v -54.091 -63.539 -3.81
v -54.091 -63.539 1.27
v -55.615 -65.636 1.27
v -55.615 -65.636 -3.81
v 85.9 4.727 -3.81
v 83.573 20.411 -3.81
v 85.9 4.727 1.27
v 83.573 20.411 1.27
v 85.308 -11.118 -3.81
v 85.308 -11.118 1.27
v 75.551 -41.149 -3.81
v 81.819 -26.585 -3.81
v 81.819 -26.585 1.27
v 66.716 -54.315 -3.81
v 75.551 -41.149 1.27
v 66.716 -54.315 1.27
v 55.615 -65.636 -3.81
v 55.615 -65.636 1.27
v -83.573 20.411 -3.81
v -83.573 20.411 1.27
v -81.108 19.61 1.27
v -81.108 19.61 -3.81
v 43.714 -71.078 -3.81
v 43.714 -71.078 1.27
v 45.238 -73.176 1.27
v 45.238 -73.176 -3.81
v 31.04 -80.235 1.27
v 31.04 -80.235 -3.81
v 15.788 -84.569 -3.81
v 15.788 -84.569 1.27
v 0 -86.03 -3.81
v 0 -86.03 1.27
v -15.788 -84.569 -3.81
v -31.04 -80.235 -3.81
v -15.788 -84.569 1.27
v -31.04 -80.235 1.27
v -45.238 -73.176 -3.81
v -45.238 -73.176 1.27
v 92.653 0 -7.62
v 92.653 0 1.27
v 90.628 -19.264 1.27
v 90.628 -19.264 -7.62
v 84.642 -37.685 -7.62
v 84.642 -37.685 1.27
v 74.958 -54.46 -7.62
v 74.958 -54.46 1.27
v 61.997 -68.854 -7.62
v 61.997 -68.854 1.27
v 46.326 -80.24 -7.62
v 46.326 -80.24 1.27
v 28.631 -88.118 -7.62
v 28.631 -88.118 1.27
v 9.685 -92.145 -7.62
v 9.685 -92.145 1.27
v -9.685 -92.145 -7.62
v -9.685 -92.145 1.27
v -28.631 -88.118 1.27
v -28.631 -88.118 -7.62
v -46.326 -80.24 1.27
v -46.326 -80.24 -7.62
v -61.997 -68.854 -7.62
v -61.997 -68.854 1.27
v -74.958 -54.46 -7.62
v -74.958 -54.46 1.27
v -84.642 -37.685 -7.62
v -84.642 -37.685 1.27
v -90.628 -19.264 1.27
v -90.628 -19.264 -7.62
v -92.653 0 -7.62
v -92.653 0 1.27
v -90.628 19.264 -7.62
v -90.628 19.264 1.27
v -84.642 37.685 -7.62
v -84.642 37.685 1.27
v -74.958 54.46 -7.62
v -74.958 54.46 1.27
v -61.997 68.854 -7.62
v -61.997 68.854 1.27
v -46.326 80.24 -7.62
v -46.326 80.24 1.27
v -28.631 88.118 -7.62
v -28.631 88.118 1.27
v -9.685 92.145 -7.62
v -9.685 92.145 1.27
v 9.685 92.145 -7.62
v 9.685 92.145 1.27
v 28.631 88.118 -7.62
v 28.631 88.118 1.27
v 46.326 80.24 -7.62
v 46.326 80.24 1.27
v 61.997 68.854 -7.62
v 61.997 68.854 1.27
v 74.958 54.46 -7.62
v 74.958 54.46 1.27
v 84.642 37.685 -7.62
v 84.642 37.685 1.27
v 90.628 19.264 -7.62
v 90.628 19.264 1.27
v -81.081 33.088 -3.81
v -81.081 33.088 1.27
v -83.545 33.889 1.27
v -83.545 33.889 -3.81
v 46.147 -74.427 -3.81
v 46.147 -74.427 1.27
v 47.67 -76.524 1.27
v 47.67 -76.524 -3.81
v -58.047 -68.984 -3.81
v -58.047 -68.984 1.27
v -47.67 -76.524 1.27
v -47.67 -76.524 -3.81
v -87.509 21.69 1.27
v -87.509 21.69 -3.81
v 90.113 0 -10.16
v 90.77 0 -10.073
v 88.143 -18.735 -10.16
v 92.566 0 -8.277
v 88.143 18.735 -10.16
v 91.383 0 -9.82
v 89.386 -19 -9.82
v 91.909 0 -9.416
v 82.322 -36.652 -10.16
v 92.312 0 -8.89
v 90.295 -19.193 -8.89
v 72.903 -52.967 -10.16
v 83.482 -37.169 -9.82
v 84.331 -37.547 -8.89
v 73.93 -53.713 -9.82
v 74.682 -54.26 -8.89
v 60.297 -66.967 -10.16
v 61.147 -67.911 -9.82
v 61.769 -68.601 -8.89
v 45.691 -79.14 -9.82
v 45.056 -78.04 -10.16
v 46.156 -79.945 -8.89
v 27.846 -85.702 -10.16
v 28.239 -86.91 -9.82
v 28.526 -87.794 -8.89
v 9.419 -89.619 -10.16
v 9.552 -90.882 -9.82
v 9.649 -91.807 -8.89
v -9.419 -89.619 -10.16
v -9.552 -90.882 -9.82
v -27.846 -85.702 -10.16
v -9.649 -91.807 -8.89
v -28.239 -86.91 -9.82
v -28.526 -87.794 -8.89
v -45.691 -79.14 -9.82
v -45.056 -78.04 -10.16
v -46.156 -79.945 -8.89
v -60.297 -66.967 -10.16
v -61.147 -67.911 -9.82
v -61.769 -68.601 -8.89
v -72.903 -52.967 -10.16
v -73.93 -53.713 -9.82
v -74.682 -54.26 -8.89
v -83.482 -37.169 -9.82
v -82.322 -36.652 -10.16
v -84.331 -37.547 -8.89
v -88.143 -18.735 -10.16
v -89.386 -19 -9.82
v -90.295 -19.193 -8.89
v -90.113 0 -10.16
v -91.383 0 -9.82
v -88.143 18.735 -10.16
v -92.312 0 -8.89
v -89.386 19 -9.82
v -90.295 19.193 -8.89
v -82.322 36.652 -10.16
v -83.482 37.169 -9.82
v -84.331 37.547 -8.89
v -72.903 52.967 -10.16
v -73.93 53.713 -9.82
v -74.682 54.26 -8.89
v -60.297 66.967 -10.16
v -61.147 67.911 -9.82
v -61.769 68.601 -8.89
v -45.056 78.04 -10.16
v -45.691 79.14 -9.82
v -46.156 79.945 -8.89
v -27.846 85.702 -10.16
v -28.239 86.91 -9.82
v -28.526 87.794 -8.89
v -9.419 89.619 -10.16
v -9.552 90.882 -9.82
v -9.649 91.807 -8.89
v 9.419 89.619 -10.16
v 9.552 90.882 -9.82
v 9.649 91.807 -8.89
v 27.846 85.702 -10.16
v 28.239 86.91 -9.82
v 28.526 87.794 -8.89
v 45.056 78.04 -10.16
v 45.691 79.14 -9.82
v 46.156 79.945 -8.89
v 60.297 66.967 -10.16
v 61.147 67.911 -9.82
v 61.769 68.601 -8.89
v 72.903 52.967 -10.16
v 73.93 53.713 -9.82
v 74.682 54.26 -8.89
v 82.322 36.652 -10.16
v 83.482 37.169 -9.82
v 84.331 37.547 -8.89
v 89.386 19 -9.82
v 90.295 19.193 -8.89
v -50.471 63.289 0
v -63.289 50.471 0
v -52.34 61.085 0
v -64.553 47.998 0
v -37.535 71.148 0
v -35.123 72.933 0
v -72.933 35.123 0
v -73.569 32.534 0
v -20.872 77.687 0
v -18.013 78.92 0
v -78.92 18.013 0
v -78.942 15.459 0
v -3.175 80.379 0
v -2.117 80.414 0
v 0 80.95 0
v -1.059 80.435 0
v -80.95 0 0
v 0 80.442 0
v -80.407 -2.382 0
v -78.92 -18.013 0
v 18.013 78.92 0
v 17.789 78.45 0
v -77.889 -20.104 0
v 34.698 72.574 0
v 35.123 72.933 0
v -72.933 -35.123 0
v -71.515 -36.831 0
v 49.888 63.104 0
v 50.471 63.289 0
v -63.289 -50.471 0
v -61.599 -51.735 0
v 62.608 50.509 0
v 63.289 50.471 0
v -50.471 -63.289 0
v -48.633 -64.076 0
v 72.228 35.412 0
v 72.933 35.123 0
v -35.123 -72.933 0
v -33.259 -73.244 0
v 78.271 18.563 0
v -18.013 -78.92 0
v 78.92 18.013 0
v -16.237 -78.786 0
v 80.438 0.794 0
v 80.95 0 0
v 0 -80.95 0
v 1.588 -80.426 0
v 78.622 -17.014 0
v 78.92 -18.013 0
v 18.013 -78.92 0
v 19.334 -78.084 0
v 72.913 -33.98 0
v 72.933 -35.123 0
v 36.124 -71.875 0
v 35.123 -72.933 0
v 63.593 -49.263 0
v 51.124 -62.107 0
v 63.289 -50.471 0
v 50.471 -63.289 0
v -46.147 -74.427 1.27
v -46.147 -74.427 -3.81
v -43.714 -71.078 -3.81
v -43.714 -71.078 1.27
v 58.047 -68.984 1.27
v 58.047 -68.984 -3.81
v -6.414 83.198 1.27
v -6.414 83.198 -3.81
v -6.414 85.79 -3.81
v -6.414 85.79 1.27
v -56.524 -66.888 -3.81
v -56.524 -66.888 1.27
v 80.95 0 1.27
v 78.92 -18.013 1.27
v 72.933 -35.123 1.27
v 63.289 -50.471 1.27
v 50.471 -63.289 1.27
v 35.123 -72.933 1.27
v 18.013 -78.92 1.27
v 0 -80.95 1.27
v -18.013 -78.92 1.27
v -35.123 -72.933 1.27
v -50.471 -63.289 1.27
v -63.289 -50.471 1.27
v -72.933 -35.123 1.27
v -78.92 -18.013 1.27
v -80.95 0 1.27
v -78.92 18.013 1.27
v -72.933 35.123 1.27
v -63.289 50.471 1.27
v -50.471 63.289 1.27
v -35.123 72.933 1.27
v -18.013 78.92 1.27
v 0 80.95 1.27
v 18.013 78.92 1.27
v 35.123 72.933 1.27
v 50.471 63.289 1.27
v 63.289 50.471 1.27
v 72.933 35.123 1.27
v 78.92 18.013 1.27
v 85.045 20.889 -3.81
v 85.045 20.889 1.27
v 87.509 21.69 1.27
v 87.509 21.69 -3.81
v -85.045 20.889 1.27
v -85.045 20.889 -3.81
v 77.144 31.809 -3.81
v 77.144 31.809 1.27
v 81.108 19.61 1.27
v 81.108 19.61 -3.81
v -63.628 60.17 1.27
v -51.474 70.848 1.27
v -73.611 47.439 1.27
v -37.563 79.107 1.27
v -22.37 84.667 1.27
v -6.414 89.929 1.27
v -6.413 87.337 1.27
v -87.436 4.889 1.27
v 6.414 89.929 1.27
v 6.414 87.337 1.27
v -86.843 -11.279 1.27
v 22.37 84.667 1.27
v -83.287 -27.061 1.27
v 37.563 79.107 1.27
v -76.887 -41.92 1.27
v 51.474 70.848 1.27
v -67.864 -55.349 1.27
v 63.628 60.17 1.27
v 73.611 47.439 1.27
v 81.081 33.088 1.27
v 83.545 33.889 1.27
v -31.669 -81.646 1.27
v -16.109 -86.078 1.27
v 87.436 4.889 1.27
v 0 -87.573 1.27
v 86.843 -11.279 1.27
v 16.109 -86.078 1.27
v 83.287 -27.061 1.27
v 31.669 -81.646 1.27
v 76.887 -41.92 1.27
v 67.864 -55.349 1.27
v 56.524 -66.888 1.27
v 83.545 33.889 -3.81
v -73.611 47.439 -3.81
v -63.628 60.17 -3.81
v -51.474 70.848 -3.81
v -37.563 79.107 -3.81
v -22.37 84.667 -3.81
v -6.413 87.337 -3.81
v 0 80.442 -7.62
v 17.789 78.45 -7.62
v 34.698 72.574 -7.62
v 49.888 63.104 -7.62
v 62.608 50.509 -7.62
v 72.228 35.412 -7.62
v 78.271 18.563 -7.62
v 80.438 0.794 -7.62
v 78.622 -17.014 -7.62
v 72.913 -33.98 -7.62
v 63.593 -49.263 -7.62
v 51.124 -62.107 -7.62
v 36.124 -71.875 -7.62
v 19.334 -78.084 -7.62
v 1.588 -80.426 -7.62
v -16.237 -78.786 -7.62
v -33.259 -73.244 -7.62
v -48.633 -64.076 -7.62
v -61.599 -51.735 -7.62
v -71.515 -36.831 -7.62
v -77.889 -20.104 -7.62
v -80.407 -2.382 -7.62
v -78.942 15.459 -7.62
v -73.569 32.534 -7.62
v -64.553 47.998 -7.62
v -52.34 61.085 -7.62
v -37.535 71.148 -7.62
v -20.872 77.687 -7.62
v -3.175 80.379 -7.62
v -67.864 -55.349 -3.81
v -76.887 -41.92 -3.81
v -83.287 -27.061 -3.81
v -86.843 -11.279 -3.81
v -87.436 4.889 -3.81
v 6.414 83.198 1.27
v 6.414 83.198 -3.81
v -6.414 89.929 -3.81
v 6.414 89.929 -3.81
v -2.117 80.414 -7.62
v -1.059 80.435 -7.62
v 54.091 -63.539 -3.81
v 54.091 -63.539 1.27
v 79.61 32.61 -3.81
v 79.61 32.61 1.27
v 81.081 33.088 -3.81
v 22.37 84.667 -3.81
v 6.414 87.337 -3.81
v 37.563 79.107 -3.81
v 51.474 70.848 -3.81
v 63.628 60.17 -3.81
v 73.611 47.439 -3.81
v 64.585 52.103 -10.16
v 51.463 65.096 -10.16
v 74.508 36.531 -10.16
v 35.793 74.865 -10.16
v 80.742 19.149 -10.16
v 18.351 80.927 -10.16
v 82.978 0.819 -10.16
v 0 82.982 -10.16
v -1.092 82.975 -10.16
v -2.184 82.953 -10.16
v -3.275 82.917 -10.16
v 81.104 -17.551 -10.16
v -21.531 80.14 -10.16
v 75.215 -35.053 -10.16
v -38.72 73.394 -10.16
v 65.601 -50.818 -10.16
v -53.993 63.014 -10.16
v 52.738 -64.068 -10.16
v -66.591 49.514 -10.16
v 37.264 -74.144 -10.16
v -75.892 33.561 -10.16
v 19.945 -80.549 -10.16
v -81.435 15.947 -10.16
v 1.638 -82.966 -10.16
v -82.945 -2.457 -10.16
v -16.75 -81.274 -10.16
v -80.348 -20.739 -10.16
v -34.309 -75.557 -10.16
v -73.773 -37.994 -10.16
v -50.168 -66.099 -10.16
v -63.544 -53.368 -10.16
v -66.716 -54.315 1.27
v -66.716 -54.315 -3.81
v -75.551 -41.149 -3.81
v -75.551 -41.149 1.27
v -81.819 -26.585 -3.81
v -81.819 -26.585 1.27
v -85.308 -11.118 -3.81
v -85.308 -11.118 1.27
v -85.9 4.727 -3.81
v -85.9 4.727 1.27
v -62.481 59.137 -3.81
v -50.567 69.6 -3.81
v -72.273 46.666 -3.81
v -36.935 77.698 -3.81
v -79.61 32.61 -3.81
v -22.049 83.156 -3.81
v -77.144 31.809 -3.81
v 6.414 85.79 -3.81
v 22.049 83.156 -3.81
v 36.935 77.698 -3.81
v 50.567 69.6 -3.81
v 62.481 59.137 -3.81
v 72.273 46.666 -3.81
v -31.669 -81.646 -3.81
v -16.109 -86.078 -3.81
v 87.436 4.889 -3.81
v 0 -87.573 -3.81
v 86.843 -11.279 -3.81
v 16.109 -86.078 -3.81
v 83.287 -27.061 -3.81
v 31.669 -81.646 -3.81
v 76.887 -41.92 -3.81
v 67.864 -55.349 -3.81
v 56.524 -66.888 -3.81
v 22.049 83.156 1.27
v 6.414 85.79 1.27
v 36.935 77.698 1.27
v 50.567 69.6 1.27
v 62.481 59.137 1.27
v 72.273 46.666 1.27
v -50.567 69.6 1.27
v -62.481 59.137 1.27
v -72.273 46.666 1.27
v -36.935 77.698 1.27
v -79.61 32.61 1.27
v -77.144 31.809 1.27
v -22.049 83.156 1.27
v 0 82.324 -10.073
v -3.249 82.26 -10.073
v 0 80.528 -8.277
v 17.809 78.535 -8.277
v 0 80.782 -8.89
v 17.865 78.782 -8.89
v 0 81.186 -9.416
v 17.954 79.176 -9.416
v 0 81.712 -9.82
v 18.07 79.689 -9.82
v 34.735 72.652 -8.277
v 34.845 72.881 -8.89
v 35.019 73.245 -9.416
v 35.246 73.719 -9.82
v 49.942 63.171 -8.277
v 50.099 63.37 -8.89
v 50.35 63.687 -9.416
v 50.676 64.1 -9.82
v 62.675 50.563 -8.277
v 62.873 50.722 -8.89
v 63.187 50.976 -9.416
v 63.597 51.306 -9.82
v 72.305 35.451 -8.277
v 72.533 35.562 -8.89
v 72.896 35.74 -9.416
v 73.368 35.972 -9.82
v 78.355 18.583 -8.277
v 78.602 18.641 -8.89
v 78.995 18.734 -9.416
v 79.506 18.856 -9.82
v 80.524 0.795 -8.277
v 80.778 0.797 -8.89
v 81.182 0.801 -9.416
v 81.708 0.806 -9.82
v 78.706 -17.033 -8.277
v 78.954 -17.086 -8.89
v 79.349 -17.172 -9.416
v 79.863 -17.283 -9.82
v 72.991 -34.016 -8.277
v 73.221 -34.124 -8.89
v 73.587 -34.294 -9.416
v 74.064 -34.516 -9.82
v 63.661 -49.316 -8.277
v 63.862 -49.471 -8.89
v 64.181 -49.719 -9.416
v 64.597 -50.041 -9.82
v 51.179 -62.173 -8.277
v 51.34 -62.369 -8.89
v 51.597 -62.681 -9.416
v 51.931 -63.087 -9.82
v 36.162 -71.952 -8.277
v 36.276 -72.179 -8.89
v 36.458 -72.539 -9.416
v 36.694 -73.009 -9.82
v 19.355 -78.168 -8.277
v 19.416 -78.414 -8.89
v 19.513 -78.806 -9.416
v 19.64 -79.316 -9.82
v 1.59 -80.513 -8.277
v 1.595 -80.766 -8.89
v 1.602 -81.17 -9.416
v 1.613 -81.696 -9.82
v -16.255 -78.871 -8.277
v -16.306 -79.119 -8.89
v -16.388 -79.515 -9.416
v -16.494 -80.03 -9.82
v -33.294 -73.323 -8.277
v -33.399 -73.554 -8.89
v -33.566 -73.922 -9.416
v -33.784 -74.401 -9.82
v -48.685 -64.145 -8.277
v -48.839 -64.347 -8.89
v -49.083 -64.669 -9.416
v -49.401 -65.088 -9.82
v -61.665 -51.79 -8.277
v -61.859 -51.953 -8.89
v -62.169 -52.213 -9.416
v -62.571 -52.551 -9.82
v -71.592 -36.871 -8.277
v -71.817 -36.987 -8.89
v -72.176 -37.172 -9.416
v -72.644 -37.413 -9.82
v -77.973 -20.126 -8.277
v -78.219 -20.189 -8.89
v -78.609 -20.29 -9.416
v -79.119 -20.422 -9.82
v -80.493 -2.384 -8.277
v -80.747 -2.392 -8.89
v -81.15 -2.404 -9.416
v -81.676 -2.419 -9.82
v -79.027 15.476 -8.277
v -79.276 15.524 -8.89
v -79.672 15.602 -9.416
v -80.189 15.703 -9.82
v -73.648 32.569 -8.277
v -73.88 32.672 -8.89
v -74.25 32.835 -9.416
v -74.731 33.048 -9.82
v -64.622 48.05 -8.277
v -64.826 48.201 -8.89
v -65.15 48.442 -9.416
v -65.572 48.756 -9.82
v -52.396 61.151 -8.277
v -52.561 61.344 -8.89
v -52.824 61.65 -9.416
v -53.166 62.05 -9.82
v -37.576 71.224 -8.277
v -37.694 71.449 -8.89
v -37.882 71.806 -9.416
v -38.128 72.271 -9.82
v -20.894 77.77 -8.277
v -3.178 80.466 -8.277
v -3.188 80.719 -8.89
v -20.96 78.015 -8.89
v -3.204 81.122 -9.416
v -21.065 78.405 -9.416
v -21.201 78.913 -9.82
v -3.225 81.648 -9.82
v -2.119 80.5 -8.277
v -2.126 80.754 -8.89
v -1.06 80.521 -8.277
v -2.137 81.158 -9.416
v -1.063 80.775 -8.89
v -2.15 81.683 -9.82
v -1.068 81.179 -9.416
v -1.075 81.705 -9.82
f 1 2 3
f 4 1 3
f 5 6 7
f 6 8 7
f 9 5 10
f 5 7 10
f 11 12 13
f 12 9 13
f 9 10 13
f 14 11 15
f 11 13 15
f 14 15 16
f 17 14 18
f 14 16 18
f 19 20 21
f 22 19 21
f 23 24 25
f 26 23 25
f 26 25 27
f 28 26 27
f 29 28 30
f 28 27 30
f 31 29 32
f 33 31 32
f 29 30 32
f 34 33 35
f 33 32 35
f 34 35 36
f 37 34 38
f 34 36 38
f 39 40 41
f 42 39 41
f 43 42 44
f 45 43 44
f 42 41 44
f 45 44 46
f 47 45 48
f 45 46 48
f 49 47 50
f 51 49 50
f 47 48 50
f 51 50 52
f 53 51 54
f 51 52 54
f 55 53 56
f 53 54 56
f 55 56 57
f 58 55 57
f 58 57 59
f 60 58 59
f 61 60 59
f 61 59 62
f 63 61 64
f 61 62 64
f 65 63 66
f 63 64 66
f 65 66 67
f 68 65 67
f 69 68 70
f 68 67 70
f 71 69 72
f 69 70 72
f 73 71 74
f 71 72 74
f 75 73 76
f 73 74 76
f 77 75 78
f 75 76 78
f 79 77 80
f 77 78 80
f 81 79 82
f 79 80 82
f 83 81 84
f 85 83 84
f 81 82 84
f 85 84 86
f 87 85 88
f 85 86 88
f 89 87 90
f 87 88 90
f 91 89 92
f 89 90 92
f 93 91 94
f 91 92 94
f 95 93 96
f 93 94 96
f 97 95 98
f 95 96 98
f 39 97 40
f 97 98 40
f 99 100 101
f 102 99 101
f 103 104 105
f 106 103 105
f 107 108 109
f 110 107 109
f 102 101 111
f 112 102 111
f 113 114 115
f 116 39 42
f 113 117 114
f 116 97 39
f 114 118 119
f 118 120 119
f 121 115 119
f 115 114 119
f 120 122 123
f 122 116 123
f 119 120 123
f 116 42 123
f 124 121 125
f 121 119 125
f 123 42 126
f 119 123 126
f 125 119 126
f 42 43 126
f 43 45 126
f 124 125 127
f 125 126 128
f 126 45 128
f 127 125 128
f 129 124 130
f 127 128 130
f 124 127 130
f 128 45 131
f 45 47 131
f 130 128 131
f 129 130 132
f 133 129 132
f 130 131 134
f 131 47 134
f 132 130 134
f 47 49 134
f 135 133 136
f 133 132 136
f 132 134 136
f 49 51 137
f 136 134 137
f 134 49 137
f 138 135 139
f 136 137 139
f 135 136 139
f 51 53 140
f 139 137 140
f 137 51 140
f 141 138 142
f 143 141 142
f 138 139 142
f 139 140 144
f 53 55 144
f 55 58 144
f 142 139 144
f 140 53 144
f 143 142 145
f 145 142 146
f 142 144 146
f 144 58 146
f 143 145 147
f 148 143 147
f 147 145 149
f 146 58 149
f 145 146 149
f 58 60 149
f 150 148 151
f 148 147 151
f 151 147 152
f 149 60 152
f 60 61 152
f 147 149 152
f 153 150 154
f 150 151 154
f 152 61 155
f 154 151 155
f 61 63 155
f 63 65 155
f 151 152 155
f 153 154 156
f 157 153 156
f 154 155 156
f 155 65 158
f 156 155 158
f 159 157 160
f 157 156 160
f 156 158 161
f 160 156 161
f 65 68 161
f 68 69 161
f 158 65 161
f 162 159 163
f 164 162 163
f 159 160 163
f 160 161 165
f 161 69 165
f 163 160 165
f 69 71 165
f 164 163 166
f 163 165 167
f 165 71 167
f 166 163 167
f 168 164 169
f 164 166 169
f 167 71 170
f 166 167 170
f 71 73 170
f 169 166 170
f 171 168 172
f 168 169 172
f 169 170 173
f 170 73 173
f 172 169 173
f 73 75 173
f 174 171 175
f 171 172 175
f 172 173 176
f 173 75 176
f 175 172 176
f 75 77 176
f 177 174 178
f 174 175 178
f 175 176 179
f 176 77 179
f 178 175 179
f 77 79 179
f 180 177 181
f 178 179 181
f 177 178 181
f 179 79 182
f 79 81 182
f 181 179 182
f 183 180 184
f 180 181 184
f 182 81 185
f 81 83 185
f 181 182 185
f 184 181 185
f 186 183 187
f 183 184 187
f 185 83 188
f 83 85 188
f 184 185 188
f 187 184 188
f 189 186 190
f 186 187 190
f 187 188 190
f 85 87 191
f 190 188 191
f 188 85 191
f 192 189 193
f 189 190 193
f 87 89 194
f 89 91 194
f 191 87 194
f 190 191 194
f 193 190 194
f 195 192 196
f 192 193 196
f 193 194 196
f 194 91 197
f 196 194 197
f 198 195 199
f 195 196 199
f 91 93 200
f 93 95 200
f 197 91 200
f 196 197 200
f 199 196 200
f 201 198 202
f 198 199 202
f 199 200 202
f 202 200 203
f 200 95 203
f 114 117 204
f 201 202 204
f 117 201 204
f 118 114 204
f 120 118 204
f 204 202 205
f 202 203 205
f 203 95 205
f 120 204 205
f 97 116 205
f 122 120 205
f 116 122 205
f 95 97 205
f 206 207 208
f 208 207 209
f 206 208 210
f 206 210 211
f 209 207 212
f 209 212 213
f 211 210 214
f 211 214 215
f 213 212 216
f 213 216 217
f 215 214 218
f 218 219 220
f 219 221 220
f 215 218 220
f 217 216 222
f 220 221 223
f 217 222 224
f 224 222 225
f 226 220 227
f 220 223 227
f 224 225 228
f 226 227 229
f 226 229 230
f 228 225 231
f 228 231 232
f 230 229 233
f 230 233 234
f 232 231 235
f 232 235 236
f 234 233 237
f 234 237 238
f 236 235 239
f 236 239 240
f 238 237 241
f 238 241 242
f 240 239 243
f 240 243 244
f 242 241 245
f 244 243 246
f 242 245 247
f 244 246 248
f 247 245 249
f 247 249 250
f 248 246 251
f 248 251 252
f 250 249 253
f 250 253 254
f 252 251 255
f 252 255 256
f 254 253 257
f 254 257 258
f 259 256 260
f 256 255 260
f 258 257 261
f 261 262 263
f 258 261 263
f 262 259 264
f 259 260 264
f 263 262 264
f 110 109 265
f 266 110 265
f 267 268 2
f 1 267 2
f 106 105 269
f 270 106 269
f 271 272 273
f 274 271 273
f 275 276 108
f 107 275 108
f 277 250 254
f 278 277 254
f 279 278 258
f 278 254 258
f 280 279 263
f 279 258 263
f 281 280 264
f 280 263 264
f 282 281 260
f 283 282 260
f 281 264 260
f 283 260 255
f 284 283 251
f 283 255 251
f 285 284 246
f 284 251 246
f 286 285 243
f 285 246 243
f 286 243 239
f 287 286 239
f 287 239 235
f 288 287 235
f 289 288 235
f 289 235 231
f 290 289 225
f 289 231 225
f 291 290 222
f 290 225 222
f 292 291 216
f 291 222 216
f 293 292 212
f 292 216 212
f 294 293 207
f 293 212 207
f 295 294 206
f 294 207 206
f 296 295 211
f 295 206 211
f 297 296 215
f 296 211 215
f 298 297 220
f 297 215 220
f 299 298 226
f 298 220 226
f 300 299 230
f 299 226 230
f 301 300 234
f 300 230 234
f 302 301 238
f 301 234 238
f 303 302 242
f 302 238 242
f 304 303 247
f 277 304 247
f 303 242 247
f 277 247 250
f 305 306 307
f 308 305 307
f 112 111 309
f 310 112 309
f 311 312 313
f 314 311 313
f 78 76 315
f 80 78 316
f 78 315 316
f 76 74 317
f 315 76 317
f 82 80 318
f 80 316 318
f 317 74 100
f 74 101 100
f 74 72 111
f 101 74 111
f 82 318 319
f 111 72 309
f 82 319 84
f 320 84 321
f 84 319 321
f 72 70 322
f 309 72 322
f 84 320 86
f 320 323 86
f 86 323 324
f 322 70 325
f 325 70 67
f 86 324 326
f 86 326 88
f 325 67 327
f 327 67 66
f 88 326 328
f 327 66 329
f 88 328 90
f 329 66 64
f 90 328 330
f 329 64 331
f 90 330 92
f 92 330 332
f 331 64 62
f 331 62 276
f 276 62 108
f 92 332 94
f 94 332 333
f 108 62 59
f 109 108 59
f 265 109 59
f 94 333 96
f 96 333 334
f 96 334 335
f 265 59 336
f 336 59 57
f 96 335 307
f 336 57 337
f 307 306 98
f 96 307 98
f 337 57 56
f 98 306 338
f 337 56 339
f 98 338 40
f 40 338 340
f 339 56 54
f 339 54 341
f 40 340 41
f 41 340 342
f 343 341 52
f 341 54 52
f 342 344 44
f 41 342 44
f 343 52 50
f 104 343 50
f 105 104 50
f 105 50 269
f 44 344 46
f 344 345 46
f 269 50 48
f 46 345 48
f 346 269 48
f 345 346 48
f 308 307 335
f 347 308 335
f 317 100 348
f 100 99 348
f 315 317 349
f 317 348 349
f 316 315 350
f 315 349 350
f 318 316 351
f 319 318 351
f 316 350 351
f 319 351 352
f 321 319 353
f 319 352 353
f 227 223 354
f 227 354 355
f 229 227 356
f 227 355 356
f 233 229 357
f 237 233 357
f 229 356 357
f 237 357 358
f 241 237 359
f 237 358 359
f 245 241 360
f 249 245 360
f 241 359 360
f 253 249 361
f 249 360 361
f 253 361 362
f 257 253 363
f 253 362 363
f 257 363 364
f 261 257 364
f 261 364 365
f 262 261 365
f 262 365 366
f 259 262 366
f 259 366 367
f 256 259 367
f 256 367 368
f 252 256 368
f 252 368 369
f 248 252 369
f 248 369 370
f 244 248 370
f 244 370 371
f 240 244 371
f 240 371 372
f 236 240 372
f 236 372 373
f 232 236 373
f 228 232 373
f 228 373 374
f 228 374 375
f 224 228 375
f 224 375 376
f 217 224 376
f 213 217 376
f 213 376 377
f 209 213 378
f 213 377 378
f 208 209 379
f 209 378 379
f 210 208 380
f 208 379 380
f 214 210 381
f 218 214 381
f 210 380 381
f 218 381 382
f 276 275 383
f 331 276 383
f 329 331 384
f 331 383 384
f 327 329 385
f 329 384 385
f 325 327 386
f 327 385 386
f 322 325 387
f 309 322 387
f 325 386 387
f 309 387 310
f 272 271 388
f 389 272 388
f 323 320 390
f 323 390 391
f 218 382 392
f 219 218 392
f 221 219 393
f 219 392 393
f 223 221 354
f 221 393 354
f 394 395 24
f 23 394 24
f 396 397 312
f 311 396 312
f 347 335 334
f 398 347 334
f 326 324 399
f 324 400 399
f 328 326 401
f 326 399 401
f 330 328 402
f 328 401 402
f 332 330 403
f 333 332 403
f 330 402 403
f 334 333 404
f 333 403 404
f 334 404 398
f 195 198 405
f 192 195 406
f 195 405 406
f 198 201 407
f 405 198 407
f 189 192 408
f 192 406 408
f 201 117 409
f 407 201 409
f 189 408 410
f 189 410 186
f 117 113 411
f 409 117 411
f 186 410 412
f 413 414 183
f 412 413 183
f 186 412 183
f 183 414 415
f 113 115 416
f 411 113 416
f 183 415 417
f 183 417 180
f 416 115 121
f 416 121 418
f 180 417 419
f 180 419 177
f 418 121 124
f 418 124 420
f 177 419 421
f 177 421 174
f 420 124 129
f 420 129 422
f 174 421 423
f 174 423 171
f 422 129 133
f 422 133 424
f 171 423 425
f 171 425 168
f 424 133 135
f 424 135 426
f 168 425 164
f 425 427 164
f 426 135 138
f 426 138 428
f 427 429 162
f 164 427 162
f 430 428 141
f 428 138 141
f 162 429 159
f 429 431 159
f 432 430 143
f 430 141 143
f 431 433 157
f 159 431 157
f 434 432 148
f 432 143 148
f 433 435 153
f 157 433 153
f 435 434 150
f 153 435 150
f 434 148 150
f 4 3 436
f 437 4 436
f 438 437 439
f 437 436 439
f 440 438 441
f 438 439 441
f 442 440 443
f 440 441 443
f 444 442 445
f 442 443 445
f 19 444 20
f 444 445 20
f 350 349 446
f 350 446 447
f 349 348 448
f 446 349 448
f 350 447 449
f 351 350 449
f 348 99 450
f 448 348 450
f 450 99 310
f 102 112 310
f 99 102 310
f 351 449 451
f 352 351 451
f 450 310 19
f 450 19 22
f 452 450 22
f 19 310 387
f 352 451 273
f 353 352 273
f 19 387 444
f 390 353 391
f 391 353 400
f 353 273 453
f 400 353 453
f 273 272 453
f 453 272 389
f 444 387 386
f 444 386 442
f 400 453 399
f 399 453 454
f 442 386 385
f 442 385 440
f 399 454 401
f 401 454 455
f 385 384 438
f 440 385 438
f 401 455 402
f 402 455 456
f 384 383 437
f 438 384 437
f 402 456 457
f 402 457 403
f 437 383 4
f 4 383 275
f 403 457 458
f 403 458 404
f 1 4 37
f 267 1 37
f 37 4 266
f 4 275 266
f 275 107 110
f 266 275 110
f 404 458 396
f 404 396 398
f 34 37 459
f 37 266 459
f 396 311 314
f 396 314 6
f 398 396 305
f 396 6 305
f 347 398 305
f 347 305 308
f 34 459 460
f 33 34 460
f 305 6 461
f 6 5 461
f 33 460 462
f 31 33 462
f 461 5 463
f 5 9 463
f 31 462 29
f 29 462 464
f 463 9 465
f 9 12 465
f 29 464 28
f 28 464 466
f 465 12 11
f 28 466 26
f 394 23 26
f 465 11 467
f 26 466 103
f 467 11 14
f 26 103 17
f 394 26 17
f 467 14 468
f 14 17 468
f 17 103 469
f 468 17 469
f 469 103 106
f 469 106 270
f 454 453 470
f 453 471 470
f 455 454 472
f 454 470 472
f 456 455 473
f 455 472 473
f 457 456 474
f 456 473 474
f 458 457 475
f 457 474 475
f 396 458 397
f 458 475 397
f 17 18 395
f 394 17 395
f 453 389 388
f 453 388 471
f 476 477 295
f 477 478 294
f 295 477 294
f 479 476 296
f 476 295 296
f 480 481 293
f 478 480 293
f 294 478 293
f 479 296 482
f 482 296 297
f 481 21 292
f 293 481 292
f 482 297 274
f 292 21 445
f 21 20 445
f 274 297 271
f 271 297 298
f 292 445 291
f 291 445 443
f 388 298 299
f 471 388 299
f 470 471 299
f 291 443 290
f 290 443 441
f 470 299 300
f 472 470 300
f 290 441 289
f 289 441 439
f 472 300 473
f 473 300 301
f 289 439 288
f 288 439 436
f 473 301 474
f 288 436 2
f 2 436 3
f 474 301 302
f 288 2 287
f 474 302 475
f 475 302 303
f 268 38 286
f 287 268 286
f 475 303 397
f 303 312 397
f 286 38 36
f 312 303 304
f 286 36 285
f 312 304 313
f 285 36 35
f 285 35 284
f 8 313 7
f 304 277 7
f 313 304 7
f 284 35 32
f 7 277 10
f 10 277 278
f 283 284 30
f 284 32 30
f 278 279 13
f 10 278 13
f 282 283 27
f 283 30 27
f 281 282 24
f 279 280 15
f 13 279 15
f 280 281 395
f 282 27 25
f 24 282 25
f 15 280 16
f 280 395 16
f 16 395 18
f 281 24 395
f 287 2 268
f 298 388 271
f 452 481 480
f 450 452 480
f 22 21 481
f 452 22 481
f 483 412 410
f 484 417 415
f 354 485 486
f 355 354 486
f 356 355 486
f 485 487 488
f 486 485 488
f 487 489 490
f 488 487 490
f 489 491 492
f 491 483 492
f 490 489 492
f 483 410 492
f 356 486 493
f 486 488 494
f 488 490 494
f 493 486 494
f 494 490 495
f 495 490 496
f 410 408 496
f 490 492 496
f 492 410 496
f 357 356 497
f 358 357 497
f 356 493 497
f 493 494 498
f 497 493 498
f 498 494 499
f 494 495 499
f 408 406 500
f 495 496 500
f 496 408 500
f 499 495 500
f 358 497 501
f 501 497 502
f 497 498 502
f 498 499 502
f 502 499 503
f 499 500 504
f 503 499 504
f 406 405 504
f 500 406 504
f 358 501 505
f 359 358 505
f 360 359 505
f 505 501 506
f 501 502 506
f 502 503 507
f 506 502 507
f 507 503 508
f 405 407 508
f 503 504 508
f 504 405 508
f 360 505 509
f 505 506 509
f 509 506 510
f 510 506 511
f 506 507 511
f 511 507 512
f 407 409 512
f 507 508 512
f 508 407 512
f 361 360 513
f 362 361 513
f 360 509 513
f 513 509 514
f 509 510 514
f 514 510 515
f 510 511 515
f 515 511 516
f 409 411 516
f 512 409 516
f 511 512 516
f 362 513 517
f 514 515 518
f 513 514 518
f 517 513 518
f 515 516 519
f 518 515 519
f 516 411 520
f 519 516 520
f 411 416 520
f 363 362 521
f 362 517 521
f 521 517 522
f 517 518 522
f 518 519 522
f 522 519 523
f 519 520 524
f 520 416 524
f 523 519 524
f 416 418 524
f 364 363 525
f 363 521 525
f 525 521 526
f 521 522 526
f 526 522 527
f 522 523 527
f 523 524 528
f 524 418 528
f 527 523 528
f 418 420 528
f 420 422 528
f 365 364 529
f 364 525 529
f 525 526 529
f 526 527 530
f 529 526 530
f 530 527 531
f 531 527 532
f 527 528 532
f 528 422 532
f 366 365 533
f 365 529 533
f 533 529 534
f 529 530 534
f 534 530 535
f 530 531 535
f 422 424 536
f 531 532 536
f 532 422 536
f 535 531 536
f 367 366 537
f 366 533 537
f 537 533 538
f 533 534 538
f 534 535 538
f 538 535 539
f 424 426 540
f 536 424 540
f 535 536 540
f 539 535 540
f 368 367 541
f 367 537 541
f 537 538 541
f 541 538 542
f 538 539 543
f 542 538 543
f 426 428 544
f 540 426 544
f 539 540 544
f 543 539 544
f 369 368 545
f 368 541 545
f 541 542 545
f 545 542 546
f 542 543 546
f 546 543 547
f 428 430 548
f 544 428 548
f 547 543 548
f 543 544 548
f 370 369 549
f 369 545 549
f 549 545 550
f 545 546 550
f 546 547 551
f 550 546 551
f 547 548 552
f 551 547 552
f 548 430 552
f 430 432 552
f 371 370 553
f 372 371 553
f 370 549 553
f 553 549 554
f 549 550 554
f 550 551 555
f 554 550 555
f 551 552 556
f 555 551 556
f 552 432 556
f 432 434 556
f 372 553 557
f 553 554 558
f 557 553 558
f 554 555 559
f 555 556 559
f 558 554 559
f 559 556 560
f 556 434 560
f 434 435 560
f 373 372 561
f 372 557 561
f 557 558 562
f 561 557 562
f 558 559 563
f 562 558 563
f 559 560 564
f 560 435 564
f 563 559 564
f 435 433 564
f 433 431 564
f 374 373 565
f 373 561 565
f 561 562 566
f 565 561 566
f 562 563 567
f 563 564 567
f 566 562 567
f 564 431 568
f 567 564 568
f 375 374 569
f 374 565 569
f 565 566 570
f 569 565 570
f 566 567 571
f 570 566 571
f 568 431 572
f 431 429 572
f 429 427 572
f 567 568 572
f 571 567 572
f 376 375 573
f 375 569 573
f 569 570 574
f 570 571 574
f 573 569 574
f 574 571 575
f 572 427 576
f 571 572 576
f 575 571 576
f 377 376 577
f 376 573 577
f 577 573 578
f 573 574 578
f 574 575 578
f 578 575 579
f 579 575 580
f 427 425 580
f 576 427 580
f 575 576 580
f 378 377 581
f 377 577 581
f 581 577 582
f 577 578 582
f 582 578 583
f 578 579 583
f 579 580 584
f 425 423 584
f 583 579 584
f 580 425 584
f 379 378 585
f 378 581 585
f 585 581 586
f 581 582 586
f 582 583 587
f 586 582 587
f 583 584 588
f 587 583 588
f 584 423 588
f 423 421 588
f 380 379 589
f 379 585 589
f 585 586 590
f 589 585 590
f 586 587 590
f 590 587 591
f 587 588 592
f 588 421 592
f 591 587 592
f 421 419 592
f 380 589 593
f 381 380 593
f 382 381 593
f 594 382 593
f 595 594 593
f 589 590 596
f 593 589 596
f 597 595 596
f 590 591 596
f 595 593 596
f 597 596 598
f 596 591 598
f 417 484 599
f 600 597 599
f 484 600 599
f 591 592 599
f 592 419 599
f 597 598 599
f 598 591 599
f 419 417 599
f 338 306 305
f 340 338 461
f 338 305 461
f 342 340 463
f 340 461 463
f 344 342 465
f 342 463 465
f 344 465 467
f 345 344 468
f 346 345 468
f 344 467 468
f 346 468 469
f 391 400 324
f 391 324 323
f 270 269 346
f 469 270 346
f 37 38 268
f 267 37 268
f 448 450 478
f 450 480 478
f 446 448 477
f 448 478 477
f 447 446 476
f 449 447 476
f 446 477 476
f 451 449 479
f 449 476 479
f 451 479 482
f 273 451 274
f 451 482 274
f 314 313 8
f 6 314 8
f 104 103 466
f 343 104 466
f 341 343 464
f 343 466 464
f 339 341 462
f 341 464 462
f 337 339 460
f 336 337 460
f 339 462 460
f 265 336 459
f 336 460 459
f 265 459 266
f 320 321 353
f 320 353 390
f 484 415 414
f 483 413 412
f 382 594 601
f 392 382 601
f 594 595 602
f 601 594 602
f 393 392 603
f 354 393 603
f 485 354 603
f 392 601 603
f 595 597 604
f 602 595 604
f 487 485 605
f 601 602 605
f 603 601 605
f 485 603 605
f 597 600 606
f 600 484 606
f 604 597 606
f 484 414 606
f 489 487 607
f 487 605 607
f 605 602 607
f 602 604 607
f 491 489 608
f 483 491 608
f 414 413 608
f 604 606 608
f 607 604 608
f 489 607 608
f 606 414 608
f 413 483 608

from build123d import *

# Parameters (mm, degrees)
F1_FACE1_R   = 80.9498
F1_FACE1_R_2 = 5.08
F3_DEPTH     = 25.4
F4_R         = 2.54
F5_W         = 12.827
F5_H         = 6.731
F6_DEPTH     = 5.08


with BuildPart() as f1:
    # F0 (on Front) → F1 (revolve)
    with BuildSketch(Plane.XZ):
        Polygon((80.9498, 0), (5.08, 0), (5.08, -10.16), (92.6526099873, -10.16), (92.6526099873, 1.27), (87.5726099873, 1.27), (87.5726099873, -3.81), (86.0298, -3.81), (86.0298, 1.27), (80.9498, 1.27), align=None)
    revolve(axis=Axis((0, 0, -1.5273375125), (0, 0, -1)))

    # F2 (on face) + F1_face1 (on face) → F3 (cut)
    with BuildSketch(Plane(origin=(0, 0, -10.16), x_dir=(1, 0, 0), z_dir=(0, 0, -1))):
        with BuildLine():
            ThreePointArc((80.3791177001, -3.175), (56.8809422709, 56.8809422709), (-3.175, 80.3791177001))
            ThreePointArc((-3.175, 80.3791177001), (-56.8809422709, 56.8809422709), (-80.3791177001, 3.175))
            ThreePointArc((-80.3791177001, 3.175), (-59.0816832218, -54.5915551612), (-3.175, -80.3791177001))
            ThreePointArc((-3.175, -80.3791177001), (-1.5878093455, -80.4261278984), (0, -80.4418))
            ThreePointArc((0, -80.4418), (55.7471096661, -57.9926111769), (80.3791177001, -3.175))
        make_face()
    with BuildSketch(Plane.XY):
        Circle(F1_FACE1_R)
        Circle(F1_FACE1_R_2, mode=Mode.SUBTRACT)
    extrude(amount=-F3_DEPTH, dir=(0, 0, -1), mode=Mode.SUBTRACT)

    # F4
    f4_edges = [f1.edges().sort_by_distance(p)[0] for p in [
        (3.175, 80.379118, -10.16),
        (-92.65261, 0, -10.16),
    ]]
    fillet(f4_edges, radius=F4_R)

    # F5 (on face) → F6 (cut)
    with BuildSketch(Plane.XY.offset(1.27)):
        with Locations((0, 86.5632)):
            Rectangle(F5_W, F5_H)
        Polygon((-83.5453956435, 33.8890975493), (-87.5091566304, 21.6898956148), (-81.1075952192, 19.6099022256), (-77.1438342323, 31.8091041602), align=None)
        Polygon((-58.0473941113, -68.9840858665), (-47.6701331244, -76.5236072976), (-43.7137505912, -71.0781139085), (-54.0910115781, -63.5385924773), align=None)
        Polygon((47.6701331244, -76.5236072976), (58.0473941113, -68.9840858665), (54.0910115781, -63.5385924773), (43.7137505912, -71.0781139085), align=None)
        Polygon((87.5091566304, 21.6898956148), (83.5453956435, 33.8890975493), (77.1438342323, 31.8091041602), (81.1075952192, 19.6099022256), align=None)
    extrude(amount=-F6_DEPTH, mode=Mode.SUBTRACT)


with BuildPart() as f7_1:
    # F7: copy of F1
    add(f1.part)


solid = f1.part
